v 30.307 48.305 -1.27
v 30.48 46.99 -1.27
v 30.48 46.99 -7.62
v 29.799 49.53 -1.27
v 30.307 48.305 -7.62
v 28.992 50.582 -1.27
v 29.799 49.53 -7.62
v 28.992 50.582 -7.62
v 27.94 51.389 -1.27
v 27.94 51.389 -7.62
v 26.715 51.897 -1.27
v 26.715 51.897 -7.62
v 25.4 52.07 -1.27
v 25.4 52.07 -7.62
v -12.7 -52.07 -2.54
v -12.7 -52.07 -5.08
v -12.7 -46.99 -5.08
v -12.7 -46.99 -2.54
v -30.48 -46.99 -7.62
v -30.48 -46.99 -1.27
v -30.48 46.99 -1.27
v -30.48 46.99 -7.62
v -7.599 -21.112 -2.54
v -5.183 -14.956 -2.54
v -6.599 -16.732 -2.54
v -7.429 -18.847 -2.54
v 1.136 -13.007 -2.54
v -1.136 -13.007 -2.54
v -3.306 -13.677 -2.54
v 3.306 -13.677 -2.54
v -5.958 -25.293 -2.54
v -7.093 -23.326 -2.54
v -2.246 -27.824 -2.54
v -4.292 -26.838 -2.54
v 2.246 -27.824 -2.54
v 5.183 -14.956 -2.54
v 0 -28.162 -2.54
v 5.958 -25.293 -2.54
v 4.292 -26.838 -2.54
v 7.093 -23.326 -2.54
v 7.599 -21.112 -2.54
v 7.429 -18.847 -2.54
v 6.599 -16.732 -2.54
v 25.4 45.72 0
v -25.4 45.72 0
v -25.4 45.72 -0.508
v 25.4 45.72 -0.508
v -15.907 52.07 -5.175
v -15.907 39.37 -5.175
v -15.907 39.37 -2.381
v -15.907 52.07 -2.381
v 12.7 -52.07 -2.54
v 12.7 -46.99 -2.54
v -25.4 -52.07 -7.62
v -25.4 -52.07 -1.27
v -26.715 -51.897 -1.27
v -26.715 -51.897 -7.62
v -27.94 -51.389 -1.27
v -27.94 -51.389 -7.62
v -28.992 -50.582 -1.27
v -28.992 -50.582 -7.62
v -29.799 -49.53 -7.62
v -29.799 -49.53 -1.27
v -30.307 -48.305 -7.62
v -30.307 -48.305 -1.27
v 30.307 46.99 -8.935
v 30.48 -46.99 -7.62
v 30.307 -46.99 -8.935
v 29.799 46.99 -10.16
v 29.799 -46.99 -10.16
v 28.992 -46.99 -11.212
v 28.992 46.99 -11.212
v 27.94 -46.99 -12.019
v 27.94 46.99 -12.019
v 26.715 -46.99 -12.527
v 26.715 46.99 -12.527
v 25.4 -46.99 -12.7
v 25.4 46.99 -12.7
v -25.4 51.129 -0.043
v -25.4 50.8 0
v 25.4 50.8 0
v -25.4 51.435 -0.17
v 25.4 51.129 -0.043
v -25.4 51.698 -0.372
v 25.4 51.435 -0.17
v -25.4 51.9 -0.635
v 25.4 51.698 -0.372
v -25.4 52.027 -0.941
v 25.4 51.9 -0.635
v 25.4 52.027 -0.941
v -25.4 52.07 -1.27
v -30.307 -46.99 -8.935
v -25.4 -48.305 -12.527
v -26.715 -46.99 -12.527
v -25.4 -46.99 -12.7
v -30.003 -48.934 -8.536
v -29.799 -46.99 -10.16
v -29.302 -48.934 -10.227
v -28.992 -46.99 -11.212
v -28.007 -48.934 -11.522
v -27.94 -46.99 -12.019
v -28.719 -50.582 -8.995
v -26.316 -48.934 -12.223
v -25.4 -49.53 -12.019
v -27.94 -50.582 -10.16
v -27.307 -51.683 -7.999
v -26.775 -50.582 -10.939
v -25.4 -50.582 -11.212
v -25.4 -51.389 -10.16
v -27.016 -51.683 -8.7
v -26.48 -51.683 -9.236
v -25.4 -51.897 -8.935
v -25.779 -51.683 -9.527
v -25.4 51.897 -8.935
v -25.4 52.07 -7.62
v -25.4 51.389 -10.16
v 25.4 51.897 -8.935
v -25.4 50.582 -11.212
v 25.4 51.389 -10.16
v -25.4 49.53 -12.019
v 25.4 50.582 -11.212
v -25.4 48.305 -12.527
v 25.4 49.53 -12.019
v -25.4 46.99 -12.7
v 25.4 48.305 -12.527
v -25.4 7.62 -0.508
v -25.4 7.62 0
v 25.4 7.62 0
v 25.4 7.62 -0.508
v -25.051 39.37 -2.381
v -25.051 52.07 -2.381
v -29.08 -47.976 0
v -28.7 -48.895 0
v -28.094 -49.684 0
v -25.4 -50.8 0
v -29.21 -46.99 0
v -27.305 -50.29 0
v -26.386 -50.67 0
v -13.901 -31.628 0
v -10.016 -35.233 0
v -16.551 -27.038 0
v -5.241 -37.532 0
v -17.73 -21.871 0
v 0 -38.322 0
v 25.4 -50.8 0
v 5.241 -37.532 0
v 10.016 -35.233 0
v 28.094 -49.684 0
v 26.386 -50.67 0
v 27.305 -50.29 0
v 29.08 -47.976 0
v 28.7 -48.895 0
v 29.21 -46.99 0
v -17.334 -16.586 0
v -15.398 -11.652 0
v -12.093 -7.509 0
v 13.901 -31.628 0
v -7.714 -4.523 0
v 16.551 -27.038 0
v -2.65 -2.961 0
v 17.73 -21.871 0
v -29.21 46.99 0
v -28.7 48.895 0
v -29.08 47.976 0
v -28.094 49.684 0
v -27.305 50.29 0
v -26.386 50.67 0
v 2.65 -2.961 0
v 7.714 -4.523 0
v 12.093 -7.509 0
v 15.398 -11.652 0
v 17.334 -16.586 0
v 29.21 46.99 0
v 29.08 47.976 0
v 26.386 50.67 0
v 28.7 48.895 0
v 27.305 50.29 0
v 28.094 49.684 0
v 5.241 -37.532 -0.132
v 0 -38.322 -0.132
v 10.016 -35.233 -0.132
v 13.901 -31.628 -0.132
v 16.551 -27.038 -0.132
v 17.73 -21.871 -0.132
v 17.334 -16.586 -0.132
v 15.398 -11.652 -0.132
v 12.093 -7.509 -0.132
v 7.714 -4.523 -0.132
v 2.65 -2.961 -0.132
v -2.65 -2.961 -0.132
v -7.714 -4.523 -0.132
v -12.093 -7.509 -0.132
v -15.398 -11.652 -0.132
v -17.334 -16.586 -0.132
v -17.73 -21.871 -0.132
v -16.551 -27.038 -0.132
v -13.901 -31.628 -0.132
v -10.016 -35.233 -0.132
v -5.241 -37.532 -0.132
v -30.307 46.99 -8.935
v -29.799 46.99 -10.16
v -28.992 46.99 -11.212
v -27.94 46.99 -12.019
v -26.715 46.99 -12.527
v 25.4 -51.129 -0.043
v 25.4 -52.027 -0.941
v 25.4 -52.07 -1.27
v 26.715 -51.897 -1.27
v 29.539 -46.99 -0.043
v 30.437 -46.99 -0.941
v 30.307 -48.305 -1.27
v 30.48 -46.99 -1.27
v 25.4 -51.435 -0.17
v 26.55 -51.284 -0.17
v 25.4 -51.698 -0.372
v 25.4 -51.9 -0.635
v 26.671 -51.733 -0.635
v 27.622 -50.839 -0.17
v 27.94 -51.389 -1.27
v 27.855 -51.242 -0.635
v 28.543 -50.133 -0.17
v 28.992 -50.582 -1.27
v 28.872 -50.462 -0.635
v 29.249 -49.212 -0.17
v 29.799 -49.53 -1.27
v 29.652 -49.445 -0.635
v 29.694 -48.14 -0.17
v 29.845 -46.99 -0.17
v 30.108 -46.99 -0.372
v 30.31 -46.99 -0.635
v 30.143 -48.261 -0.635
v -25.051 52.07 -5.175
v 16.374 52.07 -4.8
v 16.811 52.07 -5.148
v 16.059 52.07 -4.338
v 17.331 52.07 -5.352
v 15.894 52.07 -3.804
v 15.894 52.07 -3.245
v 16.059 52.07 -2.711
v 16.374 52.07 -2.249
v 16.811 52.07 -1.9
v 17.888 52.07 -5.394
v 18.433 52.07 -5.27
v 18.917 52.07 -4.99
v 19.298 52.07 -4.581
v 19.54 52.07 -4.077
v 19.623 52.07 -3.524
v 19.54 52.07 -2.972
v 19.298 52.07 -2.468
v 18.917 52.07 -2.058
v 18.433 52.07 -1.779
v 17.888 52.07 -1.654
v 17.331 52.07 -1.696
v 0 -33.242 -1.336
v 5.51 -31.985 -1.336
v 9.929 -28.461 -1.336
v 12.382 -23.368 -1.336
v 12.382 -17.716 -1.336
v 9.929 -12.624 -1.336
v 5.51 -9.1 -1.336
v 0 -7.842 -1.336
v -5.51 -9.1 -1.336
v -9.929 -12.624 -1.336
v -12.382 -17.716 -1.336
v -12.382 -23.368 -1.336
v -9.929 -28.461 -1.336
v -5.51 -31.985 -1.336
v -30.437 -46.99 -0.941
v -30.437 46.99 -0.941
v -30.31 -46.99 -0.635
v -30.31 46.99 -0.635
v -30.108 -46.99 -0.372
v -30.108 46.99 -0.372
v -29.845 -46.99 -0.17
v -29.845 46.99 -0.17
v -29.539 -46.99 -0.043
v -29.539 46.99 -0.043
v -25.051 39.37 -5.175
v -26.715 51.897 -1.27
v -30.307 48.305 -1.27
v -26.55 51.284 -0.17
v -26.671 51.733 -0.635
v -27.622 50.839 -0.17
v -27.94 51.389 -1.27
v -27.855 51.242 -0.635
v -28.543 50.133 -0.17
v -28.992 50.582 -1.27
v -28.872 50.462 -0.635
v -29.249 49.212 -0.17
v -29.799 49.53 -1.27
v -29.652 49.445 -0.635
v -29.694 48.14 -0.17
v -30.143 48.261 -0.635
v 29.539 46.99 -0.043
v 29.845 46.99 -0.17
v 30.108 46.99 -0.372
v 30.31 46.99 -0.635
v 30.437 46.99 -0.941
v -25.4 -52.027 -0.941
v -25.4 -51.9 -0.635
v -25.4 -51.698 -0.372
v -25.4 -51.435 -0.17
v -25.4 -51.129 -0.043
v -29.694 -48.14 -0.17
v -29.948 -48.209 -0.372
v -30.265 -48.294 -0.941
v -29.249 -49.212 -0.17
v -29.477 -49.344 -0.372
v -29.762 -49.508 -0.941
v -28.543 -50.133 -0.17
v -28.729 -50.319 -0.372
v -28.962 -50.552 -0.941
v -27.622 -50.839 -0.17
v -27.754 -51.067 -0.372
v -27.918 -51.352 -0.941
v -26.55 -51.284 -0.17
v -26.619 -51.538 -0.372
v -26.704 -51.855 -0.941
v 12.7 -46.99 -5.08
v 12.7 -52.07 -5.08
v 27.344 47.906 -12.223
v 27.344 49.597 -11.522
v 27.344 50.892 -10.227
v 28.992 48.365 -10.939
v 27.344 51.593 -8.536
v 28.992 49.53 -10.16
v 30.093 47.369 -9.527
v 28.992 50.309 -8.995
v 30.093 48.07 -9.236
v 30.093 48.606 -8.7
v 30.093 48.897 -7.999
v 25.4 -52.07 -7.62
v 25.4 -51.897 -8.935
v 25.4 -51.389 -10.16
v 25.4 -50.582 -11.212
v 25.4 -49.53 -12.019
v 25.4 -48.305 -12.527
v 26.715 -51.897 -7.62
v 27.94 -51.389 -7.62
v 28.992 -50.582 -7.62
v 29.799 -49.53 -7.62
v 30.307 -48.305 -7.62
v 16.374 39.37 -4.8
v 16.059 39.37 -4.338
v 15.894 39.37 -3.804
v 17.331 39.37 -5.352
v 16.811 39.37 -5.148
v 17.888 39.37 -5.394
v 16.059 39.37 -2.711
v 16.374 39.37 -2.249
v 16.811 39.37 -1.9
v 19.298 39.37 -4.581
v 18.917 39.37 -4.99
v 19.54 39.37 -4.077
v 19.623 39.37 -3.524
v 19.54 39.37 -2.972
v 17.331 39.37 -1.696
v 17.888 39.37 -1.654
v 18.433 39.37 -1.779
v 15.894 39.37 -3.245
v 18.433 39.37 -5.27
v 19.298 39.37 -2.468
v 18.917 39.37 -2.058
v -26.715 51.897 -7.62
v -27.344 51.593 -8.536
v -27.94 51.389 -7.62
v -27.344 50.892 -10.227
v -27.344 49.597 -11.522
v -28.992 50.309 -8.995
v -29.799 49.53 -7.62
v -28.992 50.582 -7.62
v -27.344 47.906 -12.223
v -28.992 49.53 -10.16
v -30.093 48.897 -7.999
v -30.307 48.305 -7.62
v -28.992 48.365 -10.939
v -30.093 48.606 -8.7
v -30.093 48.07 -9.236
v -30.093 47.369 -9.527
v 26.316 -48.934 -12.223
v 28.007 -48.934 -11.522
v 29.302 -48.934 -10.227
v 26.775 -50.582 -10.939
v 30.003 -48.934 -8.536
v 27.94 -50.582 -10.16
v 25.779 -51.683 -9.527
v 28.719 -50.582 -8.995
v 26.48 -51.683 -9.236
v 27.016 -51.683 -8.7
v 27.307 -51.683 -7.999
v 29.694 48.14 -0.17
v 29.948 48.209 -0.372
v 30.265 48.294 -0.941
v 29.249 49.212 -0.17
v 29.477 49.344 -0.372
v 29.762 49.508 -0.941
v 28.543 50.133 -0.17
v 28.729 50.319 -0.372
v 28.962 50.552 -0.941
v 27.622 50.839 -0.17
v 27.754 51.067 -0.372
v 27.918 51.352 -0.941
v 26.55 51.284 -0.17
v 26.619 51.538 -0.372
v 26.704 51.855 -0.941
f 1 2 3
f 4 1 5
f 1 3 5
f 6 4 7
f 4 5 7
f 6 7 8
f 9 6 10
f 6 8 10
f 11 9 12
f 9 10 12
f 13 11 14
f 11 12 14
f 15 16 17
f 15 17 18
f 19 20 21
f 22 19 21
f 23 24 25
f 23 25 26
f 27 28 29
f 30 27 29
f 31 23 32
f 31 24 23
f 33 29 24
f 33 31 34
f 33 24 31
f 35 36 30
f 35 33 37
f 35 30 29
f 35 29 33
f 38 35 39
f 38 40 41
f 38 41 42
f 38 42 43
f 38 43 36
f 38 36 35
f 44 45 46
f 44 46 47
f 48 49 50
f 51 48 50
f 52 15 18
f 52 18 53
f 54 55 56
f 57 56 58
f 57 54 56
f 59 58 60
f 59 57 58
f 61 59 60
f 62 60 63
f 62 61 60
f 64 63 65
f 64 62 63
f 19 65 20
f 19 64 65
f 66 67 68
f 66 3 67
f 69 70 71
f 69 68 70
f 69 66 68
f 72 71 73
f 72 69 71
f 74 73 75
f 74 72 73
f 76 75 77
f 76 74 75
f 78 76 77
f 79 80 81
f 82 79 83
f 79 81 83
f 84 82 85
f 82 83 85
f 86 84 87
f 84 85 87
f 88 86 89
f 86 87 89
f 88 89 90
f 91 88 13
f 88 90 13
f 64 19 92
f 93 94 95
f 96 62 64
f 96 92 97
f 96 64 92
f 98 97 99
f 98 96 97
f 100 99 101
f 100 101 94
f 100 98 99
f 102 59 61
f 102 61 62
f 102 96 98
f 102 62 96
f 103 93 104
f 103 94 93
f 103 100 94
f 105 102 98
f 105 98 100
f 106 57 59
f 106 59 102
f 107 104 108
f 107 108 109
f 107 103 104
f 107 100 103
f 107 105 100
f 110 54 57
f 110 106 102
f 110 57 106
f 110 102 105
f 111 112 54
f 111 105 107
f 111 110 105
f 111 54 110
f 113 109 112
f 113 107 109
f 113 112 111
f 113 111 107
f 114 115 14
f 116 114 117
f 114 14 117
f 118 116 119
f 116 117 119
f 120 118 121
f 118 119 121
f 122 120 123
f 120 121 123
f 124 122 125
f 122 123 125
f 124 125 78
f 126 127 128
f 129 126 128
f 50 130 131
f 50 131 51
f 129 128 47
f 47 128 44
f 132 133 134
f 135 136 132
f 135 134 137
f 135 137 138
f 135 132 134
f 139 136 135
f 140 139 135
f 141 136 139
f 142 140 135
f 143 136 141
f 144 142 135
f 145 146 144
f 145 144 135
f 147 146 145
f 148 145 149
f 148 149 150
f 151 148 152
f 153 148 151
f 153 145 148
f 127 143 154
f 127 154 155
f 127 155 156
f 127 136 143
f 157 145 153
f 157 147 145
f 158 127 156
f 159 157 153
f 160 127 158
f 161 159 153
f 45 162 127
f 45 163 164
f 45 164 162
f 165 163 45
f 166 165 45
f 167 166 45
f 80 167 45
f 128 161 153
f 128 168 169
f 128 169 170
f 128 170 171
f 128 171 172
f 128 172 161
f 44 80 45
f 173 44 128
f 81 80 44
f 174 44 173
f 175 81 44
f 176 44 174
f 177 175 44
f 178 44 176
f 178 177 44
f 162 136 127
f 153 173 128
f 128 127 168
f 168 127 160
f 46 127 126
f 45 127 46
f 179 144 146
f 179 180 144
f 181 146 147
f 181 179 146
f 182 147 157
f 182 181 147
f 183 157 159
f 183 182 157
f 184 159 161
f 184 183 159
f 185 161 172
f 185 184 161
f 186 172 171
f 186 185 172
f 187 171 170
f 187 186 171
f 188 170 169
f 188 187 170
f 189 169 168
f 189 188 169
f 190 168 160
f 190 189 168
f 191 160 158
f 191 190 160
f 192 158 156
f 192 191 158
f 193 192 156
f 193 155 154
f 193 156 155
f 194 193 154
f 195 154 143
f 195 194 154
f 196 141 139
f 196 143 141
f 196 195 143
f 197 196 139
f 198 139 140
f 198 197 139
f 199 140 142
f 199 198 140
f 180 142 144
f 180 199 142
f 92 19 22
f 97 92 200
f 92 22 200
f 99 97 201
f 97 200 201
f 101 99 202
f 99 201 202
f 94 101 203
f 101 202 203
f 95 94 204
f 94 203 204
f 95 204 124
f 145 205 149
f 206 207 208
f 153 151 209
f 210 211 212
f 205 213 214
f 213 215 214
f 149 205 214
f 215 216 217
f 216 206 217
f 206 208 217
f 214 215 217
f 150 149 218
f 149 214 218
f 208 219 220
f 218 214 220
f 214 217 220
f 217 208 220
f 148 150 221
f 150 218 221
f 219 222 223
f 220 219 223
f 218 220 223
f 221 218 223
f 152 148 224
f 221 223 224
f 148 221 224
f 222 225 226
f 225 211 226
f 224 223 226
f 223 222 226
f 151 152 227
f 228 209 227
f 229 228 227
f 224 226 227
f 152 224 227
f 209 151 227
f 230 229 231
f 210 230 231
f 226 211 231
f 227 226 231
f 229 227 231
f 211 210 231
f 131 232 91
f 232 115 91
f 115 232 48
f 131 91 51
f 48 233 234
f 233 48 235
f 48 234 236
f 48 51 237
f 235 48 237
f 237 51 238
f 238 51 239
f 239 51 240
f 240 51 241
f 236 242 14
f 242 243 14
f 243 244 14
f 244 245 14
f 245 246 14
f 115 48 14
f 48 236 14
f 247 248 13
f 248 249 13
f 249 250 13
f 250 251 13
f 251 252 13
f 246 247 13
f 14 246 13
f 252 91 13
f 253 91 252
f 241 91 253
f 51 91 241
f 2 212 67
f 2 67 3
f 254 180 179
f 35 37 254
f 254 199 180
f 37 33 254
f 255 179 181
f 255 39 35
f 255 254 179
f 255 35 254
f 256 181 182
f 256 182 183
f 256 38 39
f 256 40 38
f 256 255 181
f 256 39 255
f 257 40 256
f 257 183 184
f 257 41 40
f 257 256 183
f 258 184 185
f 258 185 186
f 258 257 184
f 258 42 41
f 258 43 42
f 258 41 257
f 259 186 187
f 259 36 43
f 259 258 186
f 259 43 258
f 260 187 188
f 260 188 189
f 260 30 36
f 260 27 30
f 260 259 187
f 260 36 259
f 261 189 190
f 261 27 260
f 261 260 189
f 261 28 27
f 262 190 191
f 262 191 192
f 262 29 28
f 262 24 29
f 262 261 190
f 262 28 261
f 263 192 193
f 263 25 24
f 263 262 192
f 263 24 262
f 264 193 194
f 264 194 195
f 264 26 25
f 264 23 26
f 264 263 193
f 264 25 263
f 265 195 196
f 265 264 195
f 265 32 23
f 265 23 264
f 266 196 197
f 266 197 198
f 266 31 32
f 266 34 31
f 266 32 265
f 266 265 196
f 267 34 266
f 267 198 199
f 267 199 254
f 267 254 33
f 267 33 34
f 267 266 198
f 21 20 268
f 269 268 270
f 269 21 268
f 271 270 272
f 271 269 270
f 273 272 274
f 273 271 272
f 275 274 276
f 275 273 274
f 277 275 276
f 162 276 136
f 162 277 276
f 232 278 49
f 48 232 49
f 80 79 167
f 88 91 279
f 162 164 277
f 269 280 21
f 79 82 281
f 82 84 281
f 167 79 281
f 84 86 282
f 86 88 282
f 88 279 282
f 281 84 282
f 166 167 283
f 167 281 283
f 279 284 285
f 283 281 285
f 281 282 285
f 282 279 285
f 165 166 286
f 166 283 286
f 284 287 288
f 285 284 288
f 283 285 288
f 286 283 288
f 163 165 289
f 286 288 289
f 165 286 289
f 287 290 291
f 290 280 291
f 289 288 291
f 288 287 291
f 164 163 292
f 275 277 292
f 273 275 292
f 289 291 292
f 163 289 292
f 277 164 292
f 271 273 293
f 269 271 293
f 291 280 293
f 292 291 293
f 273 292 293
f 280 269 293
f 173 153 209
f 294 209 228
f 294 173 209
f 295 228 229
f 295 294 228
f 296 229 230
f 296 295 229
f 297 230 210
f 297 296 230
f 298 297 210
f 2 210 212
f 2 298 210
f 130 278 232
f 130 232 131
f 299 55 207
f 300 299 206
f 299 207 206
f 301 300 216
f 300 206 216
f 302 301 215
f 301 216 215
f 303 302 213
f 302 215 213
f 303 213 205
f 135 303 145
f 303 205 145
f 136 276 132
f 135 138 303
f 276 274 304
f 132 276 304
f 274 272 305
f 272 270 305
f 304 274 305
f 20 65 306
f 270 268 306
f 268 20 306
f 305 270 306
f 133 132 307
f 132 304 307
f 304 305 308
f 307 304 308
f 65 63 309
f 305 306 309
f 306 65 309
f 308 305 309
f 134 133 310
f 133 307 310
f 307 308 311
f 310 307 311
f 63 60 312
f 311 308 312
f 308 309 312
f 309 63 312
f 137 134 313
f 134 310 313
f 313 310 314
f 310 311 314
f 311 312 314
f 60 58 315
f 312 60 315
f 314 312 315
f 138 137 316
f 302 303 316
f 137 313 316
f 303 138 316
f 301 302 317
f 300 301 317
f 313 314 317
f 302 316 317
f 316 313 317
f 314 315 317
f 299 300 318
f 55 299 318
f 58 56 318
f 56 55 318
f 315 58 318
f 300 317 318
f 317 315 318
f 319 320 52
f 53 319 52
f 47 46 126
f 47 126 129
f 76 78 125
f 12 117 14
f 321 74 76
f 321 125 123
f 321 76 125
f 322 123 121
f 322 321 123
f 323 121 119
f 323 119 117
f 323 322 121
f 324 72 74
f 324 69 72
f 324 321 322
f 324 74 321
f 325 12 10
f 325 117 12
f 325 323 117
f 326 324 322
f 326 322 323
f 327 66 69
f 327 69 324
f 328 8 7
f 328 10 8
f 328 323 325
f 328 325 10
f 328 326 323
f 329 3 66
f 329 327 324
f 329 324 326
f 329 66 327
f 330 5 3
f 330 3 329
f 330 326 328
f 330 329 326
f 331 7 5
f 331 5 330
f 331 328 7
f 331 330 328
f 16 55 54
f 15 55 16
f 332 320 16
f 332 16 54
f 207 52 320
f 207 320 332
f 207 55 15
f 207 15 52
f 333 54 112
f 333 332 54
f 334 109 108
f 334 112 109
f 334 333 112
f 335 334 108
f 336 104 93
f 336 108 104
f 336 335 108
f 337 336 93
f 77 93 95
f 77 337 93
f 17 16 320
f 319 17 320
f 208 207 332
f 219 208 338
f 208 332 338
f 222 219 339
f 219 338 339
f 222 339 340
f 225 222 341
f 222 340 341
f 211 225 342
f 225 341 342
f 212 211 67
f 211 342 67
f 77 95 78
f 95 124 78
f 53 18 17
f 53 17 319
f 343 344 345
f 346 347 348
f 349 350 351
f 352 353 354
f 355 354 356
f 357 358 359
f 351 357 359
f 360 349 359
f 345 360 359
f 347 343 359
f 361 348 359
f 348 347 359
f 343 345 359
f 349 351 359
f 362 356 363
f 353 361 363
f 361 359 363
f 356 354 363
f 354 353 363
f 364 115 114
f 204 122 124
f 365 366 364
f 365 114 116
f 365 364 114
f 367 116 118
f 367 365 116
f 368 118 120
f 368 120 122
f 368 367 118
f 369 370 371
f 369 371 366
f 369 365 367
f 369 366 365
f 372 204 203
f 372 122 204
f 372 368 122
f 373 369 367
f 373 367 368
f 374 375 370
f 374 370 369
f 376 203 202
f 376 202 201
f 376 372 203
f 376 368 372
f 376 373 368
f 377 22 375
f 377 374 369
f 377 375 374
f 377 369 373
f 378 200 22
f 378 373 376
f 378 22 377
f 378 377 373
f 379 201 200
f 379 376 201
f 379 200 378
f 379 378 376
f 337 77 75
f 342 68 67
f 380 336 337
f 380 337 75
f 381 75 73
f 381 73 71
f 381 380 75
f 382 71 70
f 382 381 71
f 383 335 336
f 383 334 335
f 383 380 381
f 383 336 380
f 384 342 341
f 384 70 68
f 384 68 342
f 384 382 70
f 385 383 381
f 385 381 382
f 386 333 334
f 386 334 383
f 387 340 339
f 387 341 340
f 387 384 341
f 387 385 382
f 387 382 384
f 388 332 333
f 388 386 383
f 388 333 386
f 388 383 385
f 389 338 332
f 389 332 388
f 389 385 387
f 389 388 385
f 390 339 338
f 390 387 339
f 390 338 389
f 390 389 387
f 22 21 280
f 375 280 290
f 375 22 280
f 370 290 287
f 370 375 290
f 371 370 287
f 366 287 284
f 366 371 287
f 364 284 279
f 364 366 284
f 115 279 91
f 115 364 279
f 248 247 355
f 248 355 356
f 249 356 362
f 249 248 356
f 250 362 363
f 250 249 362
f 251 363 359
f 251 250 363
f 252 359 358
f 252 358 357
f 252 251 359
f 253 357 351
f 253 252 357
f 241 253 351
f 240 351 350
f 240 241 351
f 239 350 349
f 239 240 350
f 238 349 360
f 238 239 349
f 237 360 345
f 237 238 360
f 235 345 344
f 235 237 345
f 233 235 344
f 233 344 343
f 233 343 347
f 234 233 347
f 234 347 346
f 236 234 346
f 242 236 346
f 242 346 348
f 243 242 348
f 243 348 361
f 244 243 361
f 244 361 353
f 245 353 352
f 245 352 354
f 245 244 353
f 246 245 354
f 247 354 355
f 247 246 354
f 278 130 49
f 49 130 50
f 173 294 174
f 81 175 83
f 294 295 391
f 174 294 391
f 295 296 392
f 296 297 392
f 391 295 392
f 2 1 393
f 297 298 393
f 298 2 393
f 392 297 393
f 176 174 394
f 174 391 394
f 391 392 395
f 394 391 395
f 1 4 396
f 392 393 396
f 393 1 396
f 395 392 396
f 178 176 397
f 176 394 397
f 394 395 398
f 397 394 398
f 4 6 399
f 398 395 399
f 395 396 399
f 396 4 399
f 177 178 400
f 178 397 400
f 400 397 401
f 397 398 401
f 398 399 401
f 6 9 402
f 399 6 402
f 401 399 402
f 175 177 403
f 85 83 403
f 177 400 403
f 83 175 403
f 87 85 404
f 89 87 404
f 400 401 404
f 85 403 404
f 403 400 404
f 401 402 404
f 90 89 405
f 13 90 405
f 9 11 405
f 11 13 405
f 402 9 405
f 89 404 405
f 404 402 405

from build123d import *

# Parameters (mm, degrees)
F0_W         = 60.96
F0_H         = 104.14
F0_R         = 17.78
F0_W_2       = 50.8
F0_H_2       = 38.1
F0_R_2       = 7.62
F5_DEPTH     = 12.7
F6_R         = 5.08
F7_R         = 1.27
F8_T1_DEPTH  = 7.62
F8_T4_ANGLE  = 90
F8_S7_W      = 5.08
F8_S7_H      = 5.08
F8_T8_DEPTH  = 5.08
F9_T1_DEPTH  = 7.62
F9_T4_ANGLE  = 90
F9_S7_W      = 5.08
F9_S7_H      = 5.08
F9_T8_DEPTH  = 5.08
F10_T1_DEPTH = 7.62
F10_T4_ANGLE = 90
F10_S7_W     = 5.08
F10_S7_H     = 5.08
F10_T8_DEPTH = 5.08
F11_T1_DEPTH = 7.62
F11_T4_ANGLE = 90
F11_S7_W     = 5.08
F11_S7_H     = 5.08
F11_T8_DEPTH = 5.08
F3_W         = 25.4
F3_H         = 2.54
F12_DEPTH    = 5.08
F4_W         = 9.1439969838
F4_H         = 2.7940007858
F13_DEPTH    = 1.27
F4_R         = 1.8751327249
F14_DEPTH    = 12.7
F17_DEPTH    = 0.508


# Not quite as in the source:
# - a fillet or chamfer that OpenCascade refuses, or shapes differently, is made with other operations: its cross-section is extruded or revolved along the edge and cut away or added


with BuildPart() as f5:
    # F0 (on Top) → F5 (new body)
    with BuildSketch(Plane.XY):
        Rectangle(F0_W, F0_H)
        with Locations((0, -21.59)):
            Circle(F0_R, mode=Mode.SUBTRACT)
        with Locations((0, 26.67)):
            Rectangle(F0_W_2, F0_H_2, mode=Mode.SUBTRACT)
        with Locations((0, 26.67)):
            Rectangle(F0_W_2, F0_H_2)
        with Locations((0, -21.59)):
            Circle(F0_R)
        with Locations((0, -21.59)):
            Circle(F0_R_2, mode=Mode.SUBTRACT)
        with Locations((0, -21.59)):
            Circle(F0_R_2)
    extrude(amount=-F5_DEPTH)

    # F6
    f6_edges = [f5.edges().sort_by_distance(p)[0] for p in [
        (0, -52.07, -12.7),
        (30.48, 0, -12.7),
        (0, 52.07, -12.7),
        (-30.48, 0, -12.7),
    ]]
    fillet(f6_edges, radius=F6_R)

    # F7
    f7_edges = [f5.edges().sort_by_distance(p)[0] for p in [
        (0, -52.07, 0),
        (30.48, 0, 0),
        (0, 52.07, 0),
        (-30.48, 0, 0),
    ]]
    fillet(f7_edges, radius=F7_R)

    # F8: fillet of radius 5.08 on 3 edges, made by hand

    # F8_s2 → F8_t1 (cut)
    with BuildSketch(Plane.XY.offset(-7.62)):
        with BuildLine():
            ThreePointArc((-25.4, -52.07), (-28.9921024484, -50.5821024484), (-30.48, -46.99))
            Line((-30.48, -46.99), (-30.48, -52.07))
            Line((-30.48, -52.07), (-25.4, -52.07))
        make_face()
    extrude(amount=F8_T1_DEPTH, mode=Mode.SUBTRACT)

    # F8_s3 → F8_t4 (revolve, cut)
    with BuildSketch(Plane.XZ.offset(46.99)):
        with BuildLine():
            ThreePointArc((-29.21, 0), (-30.1080256121, -0.3719743879), (-30.48, -1.27))
            Line((-30.48, -1.27), (-30.48, 0))
            Line((-30.48, 0), (-29.21, 0))
        make_face()
    revolve(axis=Axis((-25.4, -46.99, 0), (0, 0, 1)), revolution_arc=F8_T4_ANGLE, mode=Mode.SUBTRACT)


with BuildPart() as f8_tool6:
    # F8_s7 → F8_t8 (new body)
    with BuildSketch(Plane.XZ.offset(46.99)):
        with Locations((-27.94, -10.16)):
            Rectangle(F8_S7_W, F8_S7_H)
    extrude(amount=F8_T8_DEPTH)

    # F8_s9 → F8_t10 (revolve, cut)
    with BuildSketch(Plane(origin=(-25.4, -46.99, -7.62), x_dir=(0.7071067812, 0, 0.7071067812), z_dir=(0.7071067812, 0, -0.7071067812))):
        with BuildLine():
            ThreePointArc((0, -5.08), (5.08, 0), (0, 5.08))
            Line((0, 5.08), (0, -5.08))
        make_face()
    revolve(axis=Axis((-25.4, -46.99, -7.62), (0, -1, 0)), mode=Mode.SUBTRACT)


with BuildPart() as f5_1:
    add(f5.part)

    # F8_t5: cut F8_tool6
    add(f8_tool6.part, mode=Mode.SUBTRACT)

    # F9: fillet of radius 5.08 on 3 edges, made by hand

    # F9_s2 → F9_t1 (cut)
    with BuildSketch(Plane.XY.offset(-7.62)):
        with BuildLine():
            ThreePointArc((25.4, -52.07), (28.9921024484, -50.5821024484), (30.48, -46.99))
            Line((30.48, -46.99), (30.48, -52.07))
            Line((30.48, -52.07), (25.4, -52.07))
        make_face()
    extrude(amount=F9_T1_DEPTH, mode=Mode.SUBTRACT)

    # F9_s3 → F9_t4 (revolve, cut)
    with BuildSketch(Plane.YZ.offset(25.4)):
        with BuildLine():
            ThreePointArc((-50.8, 0), (-51.6980256121, -0.3719743879), (-52.07, -1.27))
            Line((-52.07, -1.27), (-52.07, 0))
            Line((-52.07, 0), (-50.8, 0))
        make_face()
    revolve(axis=Axis((25.4, -46.99, 0), (0, 0, 1)), revolution_arc=F9_T4_ANGLE, mode=Mode.SUBTRACT)


with BuildPart() as f9_tool6:
    # F9_s7 → F9_t8 (new body)
    with BuildSketch(Plane.XZ.offset(46.99)):
        with Locations((27.94, -10.16)):
            Rectangle(F9_S7_W, F9_S7_H)
    extrude(amount=F9_T8_DEPTH)

    # F9_s9 → F9_t10 (revolve, cut)
    with BuildSketch(Plane(origin=(25.4, -46.99, -7.62), x_dir=(-0.7071067812, 0, 0.7071067812), z_dir=(0.7071067812, 0, 0.7071067812))):
        with BuildLine():
            ThreePointArc((0, -5.08), (5.08, 0), (0, 5.08))
            Line((0, 5.08), (0, -5.08))
        make_face()
    revolve(axis=Axis((25.4, -46.99, -7.62), (0, -1, 0)), mode=Mode.SUBTRACT)


with BuildPart() as f5_2:
    add(f5_1.part)

    # F9_t5: cut F9_tool6
    add(f9_tool6.part, mode=Mode.SUBTRACT)

    # F10: fillet of radius 5.08 on 3 edges, made by hand

    # F10_s2 → F10_t1 (cut)
    with BuildSketch(Plane.XY.offset(-7.62)):
        with BuildLine():
            ThreePointArc((30.48, 46.99), (28.9921024484, 50.5821024484), (25.4, 52.07))
            Line((25.4, 52.07), (30.48, 52.07))
            Line((30.48, 52.07), (30.48, 46.99))
        make_face()
    extrude(amount=F10_T1_DEPTH, mode=Mode.SUBTRACT)

    # F10_s3 → F10_t4 (revolve, cut)
    with BuildSketch(Plane.XZ.offset(-46.99)):
        with BuildLine():
            ThreePointArc((29.21, 0), (30.1080256121, -0.3719743879), (30.48, -1.27))
            Line((30.48, -1.27), (30.48, 0))
            Line((30.48, 0), (29.21, 0))
        make_face()
    revolve(axis=Axis((25.4, 46.99, 0), (0, 0, 1)), revolution_arc=F10_T4_ANGLE, mode=Mode.SUBTRACT)


with BuildPart() as f10_tool6:
    # F10_s7 → F10_t8 (new body)
    with BuildSketch(Plane.YZ.offset(25.4)):
        with Locations((49.53, -10.16)):
            Rectangle(F10_S7_W, F10_S7_H)
    extrude(amount=F10_T8_DEPTH)

    # F10_s9 → F10_t10 (revolve, cut)
    with BuildSketch(Plane(origin=(25.4, 46.99, -7.62), x_dir=(0, -0.7071067812, 0.7071067812), z_dir=(0, 0.7071067812, 0.7071067812))):
        with BuildLine():
            ThreePointArc((0, -5.08), (5.08, 0), (0, 5.08))
            Line((0, 5.08), (0, -5.08))
        make_face()
    revolve(axis=Axis((25.4, 46.99, -7.62), (1, 0, 0)), mode=Mode.SUBTRACT)


with BuildPart() as f5_3:
    add(f5_2.part)

    # F10_t5: cut F10_tool6
    add(f10_tool6.part, mode=Mode.SUBTRACT)

    # F11: fillet of radius 5.08 on 3 edges, made by hand

    # F11_s2 → F11_t1 (cut)
    with BuildSketch(Plane.XY.offset(-7.62)):
        with BuildLine():
            ThreePointArc((-30.48, 46.99), (-28.9921024484, 50.5821024484), (-25.4, 52.07))
            Line((-25.4, 52.07), (-30.48, 52.07))
            Line((-30.48, 52.07), (-30.48, 46.99))
        make_face()
    extrude(amount=F11_T1_DEPTH, mode=Mode.SUBTRACT)

    # F11_s3 → F11_t4 (revolve, cut)
    with BuildSketch(Plane.YZ.offset(-25.4)):
        with BuildLine():
            ThreePointArc((50.8, 0), (51.6980256121, -0.3719743879), (52.07, -1.27))
            Line((52.07, -1.27), (52.07, 0))
            Line((52.07, 0), (50.8, 0))
        make_face()
    revolve(axis=Axis((-25.4, 46.99, 0), (0, 0, 1)), revolution_arc=F11_T4_ANGLE, mode=Mode.SUBTRACT)


with BuildPart() as f11_tool6:
    # F11_s7 → F11_t8 (new body)
    with BuildSketch(Plane.YZ.offset(-25.4)):
        with Locations((49.53, -10.16)):
            Rectangle(F11_S7_W, F11_S7_H)
    extrude(amount=-F11_T8_DEPTH)

    # F11_s9 → F11_t10 (revolve, cut)
    with BuildSketch(Plane(origin=(-25.4, 46.99, -7.62), x_dir=(0, -0.7071067812, 0.7071067812), z_dir=(0, -0.7071067812, -0.7071067812))):
        with BuildLine():
            ThreePointArc((0, -5.08), (5.08, 0), (0, 5.08))
            Line((0, 5.08), (0, -5.08))
        make_face()
    revolve(axis=Axis((-25.4, 46.99, -7.62), (-1, 0, 0)), mode=Mode.SUBTRACT)


with BuildPart() as f5_4:
    add(f5_3.part)

    # F11_t5: cut F11_tool6
    add(f11_tool6.part, mode=Mode.SUBTRACT)

    # F3 (on line) → F12 (cut)
    with BuildSketch(Plane.XZ.offset(52.07)):
        with Locations((0, -3.81)):
            Rectangle(F3_W, F3_H)
    extrude(amount=-F12_DEPTH, mode=Mode.SUBTRACT)

    # F4 (on line) → F13 (cut)
    with BuildSketch(Plane.XZ.offset(-52.07)):
        with Locations((-20.4787496477, -3.7782501895)):
            Rectangle(F4_W, F4_H)
    extrude(amount=F13_DEPTH, mode=Mode.SUBTRACT)

    # F4 (on line) → F14 (cut)
    with BuildSketch(Plane.XZ.offset(-52.07)):
        with Locations((17.7482496947, -3.5242501181)):
            Circle(F4_R)
        with Locations((-20.4787496477, -3.7782501895)):
            Rectangle(F4_W, F4_H)
    extrude(amount=F14_DEPTH, mode=Mode.SUBTRACT)

    # F15 (on Right) → F16 (revolve, cut)
    with BuildSketch(Plane.YZ):
        Polygon((-20.5422501868, 5.2387503395), (-38.3222501868, 4.4979169496), (-38.3222501868, -0.1322916101), (-28.1622501868, -2.54), (-20.5422501868, -2.54), align=None)
    revolve(axis=Axis((0, -20.5422501868, 1.3493751698), (0, 0, 1)), mode=Mode.SUBTRACT)

    # F0 (on Top) → F17 (cut)
    with BuildSketch(Plane.XY):
        with Locations((0, 26.67)):
            Rectangle(F0_W_2, F0_H_2)
    extrude(amount=-F17_DEPTH, mode=Mode.SUBTRACT)


solid = f5_4.part
